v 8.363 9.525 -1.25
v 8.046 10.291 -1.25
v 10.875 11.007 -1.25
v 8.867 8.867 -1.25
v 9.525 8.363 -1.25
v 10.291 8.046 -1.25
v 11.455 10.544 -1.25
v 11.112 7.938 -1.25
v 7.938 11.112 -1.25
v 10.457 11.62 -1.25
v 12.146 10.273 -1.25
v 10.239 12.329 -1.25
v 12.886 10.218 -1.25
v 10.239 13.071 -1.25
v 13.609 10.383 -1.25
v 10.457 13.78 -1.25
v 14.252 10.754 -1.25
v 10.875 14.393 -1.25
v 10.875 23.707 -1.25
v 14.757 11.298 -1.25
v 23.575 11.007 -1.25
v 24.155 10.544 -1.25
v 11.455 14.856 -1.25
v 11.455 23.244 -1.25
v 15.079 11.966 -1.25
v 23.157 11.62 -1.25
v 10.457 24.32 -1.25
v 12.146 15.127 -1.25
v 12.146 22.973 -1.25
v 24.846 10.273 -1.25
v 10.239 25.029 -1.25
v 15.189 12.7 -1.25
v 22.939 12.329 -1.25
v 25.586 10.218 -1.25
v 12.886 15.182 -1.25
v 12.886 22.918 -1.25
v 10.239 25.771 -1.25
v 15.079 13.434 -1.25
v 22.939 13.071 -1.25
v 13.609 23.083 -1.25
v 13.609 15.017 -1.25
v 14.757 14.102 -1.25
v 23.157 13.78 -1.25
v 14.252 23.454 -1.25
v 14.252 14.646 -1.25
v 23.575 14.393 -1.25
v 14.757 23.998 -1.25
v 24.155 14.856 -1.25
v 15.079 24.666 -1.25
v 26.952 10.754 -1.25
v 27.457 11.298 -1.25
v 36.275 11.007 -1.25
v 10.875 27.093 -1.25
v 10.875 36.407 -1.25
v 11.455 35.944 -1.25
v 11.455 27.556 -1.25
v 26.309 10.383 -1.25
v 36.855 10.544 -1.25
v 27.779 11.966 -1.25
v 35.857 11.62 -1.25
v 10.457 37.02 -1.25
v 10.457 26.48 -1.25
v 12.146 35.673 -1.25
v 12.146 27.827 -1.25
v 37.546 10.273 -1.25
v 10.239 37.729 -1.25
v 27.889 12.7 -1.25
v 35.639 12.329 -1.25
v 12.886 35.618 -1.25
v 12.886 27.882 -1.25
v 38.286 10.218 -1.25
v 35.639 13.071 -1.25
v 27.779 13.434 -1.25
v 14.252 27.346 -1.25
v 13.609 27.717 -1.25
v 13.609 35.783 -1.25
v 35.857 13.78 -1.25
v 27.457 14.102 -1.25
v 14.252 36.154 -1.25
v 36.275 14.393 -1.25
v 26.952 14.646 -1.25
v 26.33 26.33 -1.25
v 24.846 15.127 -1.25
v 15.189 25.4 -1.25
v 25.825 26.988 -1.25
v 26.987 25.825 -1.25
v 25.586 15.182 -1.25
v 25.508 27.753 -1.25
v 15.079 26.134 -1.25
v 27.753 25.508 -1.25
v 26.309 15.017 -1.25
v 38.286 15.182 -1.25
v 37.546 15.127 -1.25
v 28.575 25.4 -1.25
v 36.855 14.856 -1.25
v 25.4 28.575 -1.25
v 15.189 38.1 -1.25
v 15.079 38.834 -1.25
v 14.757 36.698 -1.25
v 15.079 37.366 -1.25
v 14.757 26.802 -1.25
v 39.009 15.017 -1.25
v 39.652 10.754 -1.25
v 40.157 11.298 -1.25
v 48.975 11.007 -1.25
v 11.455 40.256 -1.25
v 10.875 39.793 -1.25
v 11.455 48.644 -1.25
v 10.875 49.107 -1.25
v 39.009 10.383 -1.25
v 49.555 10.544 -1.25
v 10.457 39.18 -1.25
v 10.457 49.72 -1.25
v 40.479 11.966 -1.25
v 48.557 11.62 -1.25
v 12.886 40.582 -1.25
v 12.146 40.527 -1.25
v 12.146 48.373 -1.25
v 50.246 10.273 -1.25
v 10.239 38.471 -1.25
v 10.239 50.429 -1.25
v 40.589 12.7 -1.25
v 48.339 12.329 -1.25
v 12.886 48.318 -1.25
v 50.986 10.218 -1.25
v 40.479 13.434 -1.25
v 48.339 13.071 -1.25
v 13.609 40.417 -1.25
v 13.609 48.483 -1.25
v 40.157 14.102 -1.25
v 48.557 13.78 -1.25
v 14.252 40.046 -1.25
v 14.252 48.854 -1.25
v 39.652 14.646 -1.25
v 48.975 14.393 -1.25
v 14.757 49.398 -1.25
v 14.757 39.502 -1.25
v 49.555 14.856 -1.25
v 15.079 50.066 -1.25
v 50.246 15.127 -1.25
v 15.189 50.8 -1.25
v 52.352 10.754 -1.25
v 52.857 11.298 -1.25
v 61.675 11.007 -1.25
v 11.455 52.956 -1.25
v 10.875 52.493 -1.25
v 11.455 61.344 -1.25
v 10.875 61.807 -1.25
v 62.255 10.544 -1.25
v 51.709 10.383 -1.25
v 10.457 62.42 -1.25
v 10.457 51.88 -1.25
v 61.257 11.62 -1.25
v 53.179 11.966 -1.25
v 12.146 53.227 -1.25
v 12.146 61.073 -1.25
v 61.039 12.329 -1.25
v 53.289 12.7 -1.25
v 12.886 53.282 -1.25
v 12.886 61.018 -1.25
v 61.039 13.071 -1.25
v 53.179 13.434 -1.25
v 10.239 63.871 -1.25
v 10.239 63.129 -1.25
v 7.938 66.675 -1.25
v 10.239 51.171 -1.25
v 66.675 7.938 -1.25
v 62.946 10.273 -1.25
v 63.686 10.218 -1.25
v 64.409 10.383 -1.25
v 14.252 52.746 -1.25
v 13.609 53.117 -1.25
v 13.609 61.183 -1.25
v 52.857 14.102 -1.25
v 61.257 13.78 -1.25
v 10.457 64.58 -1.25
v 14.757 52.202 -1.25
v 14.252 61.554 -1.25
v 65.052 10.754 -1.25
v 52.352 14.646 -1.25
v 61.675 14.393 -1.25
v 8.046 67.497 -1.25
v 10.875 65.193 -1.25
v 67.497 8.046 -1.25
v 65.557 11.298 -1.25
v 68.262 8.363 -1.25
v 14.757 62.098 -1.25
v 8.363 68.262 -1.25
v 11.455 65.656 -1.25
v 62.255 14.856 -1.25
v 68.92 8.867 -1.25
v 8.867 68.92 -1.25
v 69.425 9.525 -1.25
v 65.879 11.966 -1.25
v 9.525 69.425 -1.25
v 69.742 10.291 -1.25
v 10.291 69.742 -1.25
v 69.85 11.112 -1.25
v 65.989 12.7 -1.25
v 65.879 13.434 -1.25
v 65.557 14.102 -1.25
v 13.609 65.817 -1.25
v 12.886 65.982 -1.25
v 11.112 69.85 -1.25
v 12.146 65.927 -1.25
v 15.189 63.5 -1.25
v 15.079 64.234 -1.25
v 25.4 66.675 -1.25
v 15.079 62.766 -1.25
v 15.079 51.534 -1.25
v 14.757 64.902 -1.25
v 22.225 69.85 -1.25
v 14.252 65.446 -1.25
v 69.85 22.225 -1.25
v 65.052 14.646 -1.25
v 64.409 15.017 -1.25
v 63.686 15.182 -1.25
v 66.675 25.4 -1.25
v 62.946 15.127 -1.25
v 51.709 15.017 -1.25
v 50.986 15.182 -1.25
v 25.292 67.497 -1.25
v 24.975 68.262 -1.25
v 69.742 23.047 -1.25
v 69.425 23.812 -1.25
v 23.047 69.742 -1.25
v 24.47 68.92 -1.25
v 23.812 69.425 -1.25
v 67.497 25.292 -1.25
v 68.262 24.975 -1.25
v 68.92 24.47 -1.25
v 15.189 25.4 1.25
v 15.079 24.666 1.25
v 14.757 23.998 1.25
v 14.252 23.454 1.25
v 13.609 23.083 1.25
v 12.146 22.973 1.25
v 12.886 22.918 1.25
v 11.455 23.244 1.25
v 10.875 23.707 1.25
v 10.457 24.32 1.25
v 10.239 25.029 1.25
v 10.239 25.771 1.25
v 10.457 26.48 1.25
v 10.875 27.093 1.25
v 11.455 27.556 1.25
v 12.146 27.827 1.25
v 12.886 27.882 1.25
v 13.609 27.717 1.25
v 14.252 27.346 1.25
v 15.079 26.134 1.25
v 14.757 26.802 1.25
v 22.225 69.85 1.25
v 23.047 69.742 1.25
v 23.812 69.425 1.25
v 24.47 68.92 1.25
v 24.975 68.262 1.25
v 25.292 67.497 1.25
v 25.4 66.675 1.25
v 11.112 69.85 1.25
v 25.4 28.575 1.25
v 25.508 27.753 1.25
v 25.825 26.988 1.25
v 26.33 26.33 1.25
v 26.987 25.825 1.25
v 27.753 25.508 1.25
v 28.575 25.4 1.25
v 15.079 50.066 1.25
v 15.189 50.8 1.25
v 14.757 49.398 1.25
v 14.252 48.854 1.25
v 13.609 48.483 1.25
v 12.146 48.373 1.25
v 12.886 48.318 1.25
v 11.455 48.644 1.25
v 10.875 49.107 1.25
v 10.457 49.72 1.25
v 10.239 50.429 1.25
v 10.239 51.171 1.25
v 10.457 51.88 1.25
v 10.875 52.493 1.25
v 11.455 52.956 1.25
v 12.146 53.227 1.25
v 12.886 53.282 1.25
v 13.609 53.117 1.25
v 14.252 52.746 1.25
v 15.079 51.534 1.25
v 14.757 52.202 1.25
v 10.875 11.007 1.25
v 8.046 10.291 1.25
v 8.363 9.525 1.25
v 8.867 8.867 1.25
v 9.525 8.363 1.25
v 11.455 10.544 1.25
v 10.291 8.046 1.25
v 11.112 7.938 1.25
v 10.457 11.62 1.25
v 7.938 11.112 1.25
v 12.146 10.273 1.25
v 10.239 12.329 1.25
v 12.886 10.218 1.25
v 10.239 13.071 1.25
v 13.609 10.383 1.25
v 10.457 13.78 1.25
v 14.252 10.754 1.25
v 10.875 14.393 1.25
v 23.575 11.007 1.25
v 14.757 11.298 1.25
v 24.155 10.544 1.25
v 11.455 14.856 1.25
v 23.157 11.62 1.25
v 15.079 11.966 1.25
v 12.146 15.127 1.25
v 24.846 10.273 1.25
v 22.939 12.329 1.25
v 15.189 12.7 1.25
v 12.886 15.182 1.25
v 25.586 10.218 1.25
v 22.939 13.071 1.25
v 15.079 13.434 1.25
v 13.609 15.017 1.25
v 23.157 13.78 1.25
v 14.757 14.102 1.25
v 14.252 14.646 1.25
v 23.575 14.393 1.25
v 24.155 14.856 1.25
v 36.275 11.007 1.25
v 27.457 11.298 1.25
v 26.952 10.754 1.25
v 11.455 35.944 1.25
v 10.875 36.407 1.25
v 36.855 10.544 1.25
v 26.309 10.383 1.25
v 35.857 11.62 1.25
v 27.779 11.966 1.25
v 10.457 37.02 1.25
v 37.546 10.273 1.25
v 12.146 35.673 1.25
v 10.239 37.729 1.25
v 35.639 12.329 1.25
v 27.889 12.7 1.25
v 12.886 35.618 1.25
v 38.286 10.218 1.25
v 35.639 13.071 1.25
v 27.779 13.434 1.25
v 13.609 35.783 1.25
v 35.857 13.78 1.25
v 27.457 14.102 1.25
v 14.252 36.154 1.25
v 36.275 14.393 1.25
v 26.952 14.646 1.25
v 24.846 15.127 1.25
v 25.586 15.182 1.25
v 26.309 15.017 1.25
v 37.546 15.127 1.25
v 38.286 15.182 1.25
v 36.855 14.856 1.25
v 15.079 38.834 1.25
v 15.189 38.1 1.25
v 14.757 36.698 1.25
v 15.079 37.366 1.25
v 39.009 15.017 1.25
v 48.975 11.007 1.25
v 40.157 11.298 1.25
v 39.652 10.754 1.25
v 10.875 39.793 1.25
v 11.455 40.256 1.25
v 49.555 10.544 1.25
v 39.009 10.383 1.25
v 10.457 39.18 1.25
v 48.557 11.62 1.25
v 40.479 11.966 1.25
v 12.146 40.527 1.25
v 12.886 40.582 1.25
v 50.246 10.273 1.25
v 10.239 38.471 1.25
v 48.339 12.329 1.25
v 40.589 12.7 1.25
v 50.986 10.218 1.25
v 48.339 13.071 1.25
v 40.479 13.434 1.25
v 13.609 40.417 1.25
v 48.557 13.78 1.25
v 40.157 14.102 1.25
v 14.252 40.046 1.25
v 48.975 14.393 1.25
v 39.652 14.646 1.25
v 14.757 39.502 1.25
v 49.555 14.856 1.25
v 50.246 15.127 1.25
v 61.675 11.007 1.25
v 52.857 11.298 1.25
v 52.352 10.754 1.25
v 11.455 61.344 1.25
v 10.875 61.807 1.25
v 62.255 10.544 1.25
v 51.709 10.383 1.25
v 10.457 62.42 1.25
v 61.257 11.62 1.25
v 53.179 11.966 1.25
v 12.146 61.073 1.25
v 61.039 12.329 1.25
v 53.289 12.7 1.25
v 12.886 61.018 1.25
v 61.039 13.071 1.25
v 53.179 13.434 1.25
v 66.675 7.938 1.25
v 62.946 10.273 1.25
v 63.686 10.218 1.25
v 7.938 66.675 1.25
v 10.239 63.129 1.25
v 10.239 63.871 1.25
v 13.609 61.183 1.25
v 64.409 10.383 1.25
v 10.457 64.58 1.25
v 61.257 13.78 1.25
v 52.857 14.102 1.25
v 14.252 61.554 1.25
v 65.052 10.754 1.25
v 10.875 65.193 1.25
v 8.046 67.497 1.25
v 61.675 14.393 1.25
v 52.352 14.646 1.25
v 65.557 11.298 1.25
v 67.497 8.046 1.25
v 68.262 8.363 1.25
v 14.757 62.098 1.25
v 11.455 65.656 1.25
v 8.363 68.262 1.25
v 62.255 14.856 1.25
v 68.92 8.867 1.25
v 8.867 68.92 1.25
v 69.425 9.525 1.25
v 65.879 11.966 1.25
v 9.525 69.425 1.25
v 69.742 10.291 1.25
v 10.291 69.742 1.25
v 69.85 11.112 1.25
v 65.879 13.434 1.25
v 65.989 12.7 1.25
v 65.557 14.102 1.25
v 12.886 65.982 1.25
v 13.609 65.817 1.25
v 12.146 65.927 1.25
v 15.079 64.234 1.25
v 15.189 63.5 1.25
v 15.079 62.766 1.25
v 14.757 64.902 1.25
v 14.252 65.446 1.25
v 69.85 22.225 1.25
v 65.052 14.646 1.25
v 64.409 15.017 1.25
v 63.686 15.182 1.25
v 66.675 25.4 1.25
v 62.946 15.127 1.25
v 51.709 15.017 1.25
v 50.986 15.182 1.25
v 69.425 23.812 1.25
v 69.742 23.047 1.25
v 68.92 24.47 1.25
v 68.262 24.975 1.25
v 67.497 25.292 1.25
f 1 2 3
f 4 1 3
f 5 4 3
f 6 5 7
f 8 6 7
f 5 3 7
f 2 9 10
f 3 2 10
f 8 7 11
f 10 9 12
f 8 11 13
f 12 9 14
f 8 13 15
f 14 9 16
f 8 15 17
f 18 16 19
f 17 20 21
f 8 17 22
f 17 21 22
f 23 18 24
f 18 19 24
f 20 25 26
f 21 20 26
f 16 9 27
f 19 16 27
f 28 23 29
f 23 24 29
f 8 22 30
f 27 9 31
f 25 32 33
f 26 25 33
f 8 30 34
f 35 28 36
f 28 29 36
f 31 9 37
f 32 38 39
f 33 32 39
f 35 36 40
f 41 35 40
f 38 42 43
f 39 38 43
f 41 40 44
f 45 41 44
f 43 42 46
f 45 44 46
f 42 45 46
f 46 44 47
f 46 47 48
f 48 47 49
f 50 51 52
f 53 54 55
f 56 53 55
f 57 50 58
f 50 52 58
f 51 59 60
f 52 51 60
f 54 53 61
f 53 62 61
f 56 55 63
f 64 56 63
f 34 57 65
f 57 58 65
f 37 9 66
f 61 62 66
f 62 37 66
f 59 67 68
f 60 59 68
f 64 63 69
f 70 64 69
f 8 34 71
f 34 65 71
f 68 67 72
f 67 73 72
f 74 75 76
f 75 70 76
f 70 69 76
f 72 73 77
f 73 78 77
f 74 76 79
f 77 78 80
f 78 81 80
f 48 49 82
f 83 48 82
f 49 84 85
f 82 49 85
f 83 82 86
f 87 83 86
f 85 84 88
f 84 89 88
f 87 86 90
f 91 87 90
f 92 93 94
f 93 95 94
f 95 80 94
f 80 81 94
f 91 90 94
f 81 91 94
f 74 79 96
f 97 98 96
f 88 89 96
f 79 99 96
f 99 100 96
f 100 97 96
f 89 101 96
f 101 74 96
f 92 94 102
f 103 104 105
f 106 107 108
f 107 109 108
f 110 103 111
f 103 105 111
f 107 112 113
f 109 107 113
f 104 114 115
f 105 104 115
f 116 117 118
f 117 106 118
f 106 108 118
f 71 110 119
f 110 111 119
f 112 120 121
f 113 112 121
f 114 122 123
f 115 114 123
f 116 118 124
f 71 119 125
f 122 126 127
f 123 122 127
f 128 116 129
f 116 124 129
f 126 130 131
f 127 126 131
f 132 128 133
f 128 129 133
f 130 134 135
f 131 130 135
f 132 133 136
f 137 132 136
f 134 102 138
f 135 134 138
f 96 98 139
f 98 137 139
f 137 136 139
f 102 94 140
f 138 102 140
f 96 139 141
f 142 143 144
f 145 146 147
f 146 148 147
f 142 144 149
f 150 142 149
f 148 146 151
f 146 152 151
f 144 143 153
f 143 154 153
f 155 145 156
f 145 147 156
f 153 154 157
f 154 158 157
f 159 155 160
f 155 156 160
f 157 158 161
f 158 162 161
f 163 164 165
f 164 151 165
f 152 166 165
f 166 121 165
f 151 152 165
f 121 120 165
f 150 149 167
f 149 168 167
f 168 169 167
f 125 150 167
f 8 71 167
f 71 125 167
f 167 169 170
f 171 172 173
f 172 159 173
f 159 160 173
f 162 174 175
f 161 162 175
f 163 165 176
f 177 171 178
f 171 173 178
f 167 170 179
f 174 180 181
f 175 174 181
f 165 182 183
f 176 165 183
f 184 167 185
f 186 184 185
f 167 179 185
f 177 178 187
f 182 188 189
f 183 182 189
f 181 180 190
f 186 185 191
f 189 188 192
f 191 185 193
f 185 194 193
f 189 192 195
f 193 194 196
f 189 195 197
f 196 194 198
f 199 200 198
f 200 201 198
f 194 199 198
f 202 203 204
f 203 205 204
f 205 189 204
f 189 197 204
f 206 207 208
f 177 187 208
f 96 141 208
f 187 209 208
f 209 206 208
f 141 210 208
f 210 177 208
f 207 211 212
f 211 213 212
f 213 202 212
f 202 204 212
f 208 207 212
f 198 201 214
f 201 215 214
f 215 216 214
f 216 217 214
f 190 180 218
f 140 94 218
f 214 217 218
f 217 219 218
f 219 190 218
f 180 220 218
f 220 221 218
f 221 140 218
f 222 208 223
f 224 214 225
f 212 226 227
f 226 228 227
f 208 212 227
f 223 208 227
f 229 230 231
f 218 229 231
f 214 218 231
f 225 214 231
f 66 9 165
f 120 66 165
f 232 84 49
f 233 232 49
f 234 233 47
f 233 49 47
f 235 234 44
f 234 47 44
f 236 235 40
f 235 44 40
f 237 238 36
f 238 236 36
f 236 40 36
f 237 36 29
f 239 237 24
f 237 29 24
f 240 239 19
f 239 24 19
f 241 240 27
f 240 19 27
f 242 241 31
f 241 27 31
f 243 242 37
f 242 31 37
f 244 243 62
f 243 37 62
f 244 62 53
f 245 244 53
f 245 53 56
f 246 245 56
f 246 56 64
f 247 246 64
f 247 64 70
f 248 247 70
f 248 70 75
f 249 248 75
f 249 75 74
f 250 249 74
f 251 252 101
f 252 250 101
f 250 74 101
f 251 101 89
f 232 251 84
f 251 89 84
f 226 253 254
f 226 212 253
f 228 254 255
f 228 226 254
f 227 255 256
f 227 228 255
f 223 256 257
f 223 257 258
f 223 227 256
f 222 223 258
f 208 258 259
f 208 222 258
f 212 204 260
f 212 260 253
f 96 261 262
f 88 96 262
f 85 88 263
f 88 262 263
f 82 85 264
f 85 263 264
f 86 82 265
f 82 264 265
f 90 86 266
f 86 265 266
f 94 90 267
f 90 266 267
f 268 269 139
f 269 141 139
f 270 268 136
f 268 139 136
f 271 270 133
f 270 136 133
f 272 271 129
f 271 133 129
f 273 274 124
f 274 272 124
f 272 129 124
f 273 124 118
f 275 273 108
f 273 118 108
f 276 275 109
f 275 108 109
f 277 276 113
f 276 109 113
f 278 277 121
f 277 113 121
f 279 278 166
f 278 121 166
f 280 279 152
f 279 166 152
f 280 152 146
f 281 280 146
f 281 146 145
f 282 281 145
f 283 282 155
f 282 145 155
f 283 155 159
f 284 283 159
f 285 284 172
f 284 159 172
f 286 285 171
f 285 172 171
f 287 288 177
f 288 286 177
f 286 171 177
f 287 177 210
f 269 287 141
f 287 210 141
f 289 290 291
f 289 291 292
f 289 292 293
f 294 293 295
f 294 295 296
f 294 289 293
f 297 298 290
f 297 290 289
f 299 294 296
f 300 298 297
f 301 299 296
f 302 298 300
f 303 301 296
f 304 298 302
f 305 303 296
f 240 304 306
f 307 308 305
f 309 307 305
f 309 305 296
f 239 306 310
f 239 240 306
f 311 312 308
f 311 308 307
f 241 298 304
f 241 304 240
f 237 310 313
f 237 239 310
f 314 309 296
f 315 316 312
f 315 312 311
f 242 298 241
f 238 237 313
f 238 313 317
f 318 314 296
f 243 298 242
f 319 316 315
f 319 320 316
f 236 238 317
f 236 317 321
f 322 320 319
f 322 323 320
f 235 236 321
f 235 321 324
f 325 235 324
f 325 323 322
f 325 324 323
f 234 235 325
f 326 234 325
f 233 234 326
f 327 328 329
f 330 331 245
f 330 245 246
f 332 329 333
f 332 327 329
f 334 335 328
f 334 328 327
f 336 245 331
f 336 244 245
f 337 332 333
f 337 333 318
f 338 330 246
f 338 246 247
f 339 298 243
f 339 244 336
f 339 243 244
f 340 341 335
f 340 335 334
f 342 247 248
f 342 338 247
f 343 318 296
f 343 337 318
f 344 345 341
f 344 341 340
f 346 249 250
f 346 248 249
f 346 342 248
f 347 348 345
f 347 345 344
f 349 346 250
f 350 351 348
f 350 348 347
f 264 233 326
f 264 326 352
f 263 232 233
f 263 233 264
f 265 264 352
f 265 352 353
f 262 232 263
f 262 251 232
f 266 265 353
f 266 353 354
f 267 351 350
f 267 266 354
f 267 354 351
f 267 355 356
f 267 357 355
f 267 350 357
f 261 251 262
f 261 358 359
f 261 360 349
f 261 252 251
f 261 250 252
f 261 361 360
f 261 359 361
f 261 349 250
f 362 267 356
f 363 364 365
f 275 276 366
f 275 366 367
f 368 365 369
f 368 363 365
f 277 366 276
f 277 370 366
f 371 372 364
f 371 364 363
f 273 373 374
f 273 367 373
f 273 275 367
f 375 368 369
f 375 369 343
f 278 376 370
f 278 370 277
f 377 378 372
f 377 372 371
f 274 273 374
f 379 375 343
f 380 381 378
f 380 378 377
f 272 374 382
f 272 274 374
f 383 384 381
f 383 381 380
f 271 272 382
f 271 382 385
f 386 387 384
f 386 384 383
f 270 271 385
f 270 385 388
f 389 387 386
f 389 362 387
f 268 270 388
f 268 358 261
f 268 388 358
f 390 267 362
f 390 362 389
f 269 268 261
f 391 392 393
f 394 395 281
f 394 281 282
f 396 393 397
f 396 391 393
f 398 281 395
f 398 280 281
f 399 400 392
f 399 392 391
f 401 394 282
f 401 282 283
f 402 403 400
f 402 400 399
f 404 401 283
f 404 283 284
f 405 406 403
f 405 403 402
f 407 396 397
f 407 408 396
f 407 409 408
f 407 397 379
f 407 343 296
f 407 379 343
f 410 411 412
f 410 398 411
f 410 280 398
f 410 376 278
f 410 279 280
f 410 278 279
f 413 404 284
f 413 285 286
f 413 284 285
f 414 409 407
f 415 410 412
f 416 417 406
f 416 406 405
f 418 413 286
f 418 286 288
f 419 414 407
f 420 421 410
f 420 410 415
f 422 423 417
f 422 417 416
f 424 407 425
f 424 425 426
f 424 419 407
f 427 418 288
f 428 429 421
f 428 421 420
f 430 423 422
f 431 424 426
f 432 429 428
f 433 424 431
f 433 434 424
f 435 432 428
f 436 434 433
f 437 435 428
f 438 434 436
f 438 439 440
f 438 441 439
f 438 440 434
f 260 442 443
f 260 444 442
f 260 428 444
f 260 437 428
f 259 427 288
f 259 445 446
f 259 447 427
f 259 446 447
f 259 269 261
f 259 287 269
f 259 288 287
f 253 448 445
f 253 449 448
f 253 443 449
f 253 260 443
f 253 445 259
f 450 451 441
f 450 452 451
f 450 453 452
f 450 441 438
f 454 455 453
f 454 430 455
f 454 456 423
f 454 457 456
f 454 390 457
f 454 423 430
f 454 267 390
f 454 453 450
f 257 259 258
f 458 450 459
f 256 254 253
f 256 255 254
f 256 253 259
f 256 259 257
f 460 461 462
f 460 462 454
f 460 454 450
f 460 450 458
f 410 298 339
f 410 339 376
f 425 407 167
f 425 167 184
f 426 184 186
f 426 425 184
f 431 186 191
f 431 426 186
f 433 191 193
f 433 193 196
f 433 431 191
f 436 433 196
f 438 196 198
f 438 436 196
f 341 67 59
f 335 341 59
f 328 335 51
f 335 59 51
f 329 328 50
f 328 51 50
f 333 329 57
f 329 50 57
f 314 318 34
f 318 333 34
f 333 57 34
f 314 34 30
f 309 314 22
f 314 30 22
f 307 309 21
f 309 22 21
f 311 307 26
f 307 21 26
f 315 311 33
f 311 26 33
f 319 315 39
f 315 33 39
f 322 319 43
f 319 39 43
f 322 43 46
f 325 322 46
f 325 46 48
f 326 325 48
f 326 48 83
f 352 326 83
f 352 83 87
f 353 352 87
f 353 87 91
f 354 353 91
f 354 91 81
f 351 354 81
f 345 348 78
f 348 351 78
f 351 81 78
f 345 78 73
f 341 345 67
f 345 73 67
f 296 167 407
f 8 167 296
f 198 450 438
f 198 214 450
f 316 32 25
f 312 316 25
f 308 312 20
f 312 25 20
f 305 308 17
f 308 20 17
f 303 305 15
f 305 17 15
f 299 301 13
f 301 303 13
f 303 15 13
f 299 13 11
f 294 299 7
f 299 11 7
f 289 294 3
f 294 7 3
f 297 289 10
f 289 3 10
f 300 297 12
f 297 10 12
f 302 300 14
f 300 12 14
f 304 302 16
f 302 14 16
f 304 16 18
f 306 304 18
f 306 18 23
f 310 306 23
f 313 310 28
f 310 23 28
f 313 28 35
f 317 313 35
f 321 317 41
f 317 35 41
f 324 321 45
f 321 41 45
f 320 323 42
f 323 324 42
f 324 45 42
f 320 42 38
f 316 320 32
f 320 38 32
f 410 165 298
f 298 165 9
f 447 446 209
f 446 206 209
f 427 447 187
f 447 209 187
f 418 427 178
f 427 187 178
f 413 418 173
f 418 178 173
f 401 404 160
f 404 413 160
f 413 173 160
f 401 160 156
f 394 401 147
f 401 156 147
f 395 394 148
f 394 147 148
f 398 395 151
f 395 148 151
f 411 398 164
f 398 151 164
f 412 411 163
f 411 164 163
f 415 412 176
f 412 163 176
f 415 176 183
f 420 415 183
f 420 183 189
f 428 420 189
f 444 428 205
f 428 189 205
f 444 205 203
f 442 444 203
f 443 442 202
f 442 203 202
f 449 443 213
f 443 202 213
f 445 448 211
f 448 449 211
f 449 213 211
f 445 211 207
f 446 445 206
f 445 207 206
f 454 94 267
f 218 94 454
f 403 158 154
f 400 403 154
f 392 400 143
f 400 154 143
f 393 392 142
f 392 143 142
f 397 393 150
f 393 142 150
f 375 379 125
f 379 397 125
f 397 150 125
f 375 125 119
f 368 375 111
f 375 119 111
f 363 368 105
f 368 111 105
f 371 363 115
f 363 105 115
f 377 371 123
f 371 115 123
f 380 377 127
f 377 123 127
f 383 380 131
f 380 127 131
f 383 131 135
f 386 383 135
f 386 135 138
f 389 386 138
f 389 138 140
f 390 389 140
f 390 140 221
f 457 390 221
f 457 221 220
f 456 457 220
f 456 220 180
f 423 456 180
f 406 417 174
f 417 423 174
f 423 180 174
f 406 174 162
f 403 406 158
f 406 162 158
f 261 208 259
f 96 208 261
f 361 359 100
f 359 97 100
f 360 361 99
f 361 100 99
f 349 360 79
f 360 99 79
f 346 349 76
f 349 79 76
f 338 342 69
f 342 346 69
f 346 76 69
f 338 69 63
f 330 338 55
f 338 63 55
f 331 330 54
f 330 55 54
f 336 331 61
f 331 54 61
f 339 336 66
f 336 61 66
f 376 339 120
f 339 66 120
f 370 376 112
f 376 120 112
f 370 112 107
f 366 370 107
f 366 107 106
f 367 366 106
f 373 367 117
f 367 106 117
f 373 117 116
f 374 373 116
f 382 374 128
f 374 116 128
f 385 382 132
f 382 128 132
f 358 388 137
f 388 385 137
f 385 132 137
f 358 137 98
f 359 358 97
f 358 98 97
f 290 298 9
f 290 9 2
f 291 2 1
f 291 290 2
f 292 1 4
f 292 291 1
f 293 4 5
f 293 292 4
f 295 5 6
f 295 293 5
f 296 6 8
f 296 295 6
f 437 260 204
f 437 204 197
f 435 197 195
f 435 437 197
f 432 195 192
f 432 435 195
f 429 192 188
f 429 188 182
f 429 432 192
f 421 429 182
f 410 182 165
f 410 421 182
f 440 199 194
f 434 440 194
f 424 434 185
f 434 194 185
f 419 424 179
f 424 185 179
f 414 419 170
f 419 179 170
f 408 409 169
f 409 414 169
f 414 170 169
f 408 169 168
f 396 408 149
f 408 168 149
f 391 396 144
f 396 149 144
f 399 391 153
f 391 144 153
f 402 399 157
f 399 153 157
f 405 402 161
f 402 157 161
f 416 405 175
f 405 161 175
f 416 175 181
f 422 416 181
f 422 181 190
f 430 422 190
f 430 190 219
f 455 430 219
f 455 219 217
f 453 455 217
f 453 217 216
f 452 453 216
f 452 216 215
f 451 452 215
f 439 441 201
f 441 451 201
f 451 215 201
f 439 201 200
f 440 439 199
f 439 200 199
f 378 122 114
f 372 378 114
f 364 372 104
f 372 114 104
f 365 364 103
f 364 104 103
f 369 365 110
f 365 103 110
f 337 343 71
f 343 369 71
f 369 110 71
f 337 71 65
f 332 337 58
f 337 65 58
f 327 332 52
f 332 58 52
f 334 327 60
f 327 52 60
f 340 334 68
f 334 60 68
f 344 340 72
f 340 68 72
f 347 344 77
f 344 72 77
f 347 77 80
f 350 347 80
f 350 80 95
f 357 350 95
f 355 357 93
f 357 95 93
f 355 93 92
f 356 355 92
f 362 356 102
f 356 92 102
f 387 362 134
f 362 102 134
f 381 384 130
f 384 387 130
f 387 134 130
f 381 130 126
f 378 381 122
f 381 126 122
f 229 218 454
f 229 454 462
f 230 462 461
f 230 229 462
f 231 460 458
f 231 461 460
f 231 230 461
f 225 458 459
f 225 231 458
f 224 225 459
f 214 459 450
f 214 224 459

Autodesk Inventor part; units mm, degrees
ref_plane "YZ Plane" through (0, 0, 0) normal (1, 0, 0) x (0, 1, 0)
ref_plane "XZ Plane" through (0, 0, 0) normal (0, 1, 0) x (-1, 0, 0)
ref_plane "XY Plane" through (0, 0, 0) normal (0, 0, 1) x (1, 0, 0)
sketch "Sketch1" plane through (0, 0, 0) normal (0, 0, 1) x (1, 0, 0)
  line L0 (0, 0) -> (0, 69.85) construction
  line L1 (0, 69.85) -> (7.9375, 69.85) construction
  line L2 (7.9375, 69.85) -> (7.9375, 0) construction
  line L3 (7.9375, 69.85) -> (25.4, 69.85)
  line L4 (25.4, 69.85) -> (25.4, 17.4625)
  line L5 (25.4, 17.4625) -> (69.85, 17.4625)
  line L6 (69.85, 0) -> (0, 0) construction
  line L7 (25.4, 25.4) -> (69.85, 25.4)
  line L8 (69.85, 25.4) -> (69.85, 17.4625)
  circle A0 centre (12.7, 63.5) radius 2.4892
  circle A1 centre (12.7, 50.8) radius 2.4892
  circle A2 centre (12.7, 38.1) radius 2.4892
  circle A3 centre (12.7, 25.4) radius 2.4892
  circle A4 centre (12.7, 12.7) radius 2.4892
  circle A5 centre (25.4, 12.7) radius 2.4892
  circle A6 centre (38.1, 12.7) radius 2.4892
  circle A7 centre (50.8, 12.7) radius 2.4892
  circle A8 centre (63.5, 12.7) radius 2.4892
  line L9 (69.85, 7.9375) -> (7.9375, 7.9375)
  line L10 (69.85, 17.4625) -> (69.85, 7.9375)
  line L11 (69.85, 7.9375) -> (69.85, 0) construction
  line L12 (7.9375, 69.85) -> (7.9375, 7.9375)
  line L13 (12.7, 63.5) -> (12.7, 50.8) construction
  point P0 (16.6687, 69.85)
  dimension "d0" = 17.4625
  dimension "d3" = 25.4
  dimension "d4" = 4.9784
  dimension "d7" = 12.7
  dimension "d12" = 6.35
  dimension "d15" = 12.7
  dimension "d22" = 12.7
  dimension "d23" = 9.525
  dimension "d24" = 6.35
  dimension "d30" = 25.4
  dimension "d31" = 4.7625
extrude "Extrusion1" add sketch "Sketch1" along normal mid plane 2.5 contours L3 L4 L5 L10 L9 L12
extrude "Extrusion2" add sketch "Sketch1" along normal mid plane 2.5 contours L7 L8 L5 L4
fillet "Fillet1" radius 3.175 6 edges at (25.4, 69.85, 0) (7.9375, 69.85, 0) (7.9375, 7.9375, 0) (69.85, 7.9375, 0) (69.85, 25.4, 0) (25.4, 25.4, 0)
properties part number "TTB Elevator L Gussets"
